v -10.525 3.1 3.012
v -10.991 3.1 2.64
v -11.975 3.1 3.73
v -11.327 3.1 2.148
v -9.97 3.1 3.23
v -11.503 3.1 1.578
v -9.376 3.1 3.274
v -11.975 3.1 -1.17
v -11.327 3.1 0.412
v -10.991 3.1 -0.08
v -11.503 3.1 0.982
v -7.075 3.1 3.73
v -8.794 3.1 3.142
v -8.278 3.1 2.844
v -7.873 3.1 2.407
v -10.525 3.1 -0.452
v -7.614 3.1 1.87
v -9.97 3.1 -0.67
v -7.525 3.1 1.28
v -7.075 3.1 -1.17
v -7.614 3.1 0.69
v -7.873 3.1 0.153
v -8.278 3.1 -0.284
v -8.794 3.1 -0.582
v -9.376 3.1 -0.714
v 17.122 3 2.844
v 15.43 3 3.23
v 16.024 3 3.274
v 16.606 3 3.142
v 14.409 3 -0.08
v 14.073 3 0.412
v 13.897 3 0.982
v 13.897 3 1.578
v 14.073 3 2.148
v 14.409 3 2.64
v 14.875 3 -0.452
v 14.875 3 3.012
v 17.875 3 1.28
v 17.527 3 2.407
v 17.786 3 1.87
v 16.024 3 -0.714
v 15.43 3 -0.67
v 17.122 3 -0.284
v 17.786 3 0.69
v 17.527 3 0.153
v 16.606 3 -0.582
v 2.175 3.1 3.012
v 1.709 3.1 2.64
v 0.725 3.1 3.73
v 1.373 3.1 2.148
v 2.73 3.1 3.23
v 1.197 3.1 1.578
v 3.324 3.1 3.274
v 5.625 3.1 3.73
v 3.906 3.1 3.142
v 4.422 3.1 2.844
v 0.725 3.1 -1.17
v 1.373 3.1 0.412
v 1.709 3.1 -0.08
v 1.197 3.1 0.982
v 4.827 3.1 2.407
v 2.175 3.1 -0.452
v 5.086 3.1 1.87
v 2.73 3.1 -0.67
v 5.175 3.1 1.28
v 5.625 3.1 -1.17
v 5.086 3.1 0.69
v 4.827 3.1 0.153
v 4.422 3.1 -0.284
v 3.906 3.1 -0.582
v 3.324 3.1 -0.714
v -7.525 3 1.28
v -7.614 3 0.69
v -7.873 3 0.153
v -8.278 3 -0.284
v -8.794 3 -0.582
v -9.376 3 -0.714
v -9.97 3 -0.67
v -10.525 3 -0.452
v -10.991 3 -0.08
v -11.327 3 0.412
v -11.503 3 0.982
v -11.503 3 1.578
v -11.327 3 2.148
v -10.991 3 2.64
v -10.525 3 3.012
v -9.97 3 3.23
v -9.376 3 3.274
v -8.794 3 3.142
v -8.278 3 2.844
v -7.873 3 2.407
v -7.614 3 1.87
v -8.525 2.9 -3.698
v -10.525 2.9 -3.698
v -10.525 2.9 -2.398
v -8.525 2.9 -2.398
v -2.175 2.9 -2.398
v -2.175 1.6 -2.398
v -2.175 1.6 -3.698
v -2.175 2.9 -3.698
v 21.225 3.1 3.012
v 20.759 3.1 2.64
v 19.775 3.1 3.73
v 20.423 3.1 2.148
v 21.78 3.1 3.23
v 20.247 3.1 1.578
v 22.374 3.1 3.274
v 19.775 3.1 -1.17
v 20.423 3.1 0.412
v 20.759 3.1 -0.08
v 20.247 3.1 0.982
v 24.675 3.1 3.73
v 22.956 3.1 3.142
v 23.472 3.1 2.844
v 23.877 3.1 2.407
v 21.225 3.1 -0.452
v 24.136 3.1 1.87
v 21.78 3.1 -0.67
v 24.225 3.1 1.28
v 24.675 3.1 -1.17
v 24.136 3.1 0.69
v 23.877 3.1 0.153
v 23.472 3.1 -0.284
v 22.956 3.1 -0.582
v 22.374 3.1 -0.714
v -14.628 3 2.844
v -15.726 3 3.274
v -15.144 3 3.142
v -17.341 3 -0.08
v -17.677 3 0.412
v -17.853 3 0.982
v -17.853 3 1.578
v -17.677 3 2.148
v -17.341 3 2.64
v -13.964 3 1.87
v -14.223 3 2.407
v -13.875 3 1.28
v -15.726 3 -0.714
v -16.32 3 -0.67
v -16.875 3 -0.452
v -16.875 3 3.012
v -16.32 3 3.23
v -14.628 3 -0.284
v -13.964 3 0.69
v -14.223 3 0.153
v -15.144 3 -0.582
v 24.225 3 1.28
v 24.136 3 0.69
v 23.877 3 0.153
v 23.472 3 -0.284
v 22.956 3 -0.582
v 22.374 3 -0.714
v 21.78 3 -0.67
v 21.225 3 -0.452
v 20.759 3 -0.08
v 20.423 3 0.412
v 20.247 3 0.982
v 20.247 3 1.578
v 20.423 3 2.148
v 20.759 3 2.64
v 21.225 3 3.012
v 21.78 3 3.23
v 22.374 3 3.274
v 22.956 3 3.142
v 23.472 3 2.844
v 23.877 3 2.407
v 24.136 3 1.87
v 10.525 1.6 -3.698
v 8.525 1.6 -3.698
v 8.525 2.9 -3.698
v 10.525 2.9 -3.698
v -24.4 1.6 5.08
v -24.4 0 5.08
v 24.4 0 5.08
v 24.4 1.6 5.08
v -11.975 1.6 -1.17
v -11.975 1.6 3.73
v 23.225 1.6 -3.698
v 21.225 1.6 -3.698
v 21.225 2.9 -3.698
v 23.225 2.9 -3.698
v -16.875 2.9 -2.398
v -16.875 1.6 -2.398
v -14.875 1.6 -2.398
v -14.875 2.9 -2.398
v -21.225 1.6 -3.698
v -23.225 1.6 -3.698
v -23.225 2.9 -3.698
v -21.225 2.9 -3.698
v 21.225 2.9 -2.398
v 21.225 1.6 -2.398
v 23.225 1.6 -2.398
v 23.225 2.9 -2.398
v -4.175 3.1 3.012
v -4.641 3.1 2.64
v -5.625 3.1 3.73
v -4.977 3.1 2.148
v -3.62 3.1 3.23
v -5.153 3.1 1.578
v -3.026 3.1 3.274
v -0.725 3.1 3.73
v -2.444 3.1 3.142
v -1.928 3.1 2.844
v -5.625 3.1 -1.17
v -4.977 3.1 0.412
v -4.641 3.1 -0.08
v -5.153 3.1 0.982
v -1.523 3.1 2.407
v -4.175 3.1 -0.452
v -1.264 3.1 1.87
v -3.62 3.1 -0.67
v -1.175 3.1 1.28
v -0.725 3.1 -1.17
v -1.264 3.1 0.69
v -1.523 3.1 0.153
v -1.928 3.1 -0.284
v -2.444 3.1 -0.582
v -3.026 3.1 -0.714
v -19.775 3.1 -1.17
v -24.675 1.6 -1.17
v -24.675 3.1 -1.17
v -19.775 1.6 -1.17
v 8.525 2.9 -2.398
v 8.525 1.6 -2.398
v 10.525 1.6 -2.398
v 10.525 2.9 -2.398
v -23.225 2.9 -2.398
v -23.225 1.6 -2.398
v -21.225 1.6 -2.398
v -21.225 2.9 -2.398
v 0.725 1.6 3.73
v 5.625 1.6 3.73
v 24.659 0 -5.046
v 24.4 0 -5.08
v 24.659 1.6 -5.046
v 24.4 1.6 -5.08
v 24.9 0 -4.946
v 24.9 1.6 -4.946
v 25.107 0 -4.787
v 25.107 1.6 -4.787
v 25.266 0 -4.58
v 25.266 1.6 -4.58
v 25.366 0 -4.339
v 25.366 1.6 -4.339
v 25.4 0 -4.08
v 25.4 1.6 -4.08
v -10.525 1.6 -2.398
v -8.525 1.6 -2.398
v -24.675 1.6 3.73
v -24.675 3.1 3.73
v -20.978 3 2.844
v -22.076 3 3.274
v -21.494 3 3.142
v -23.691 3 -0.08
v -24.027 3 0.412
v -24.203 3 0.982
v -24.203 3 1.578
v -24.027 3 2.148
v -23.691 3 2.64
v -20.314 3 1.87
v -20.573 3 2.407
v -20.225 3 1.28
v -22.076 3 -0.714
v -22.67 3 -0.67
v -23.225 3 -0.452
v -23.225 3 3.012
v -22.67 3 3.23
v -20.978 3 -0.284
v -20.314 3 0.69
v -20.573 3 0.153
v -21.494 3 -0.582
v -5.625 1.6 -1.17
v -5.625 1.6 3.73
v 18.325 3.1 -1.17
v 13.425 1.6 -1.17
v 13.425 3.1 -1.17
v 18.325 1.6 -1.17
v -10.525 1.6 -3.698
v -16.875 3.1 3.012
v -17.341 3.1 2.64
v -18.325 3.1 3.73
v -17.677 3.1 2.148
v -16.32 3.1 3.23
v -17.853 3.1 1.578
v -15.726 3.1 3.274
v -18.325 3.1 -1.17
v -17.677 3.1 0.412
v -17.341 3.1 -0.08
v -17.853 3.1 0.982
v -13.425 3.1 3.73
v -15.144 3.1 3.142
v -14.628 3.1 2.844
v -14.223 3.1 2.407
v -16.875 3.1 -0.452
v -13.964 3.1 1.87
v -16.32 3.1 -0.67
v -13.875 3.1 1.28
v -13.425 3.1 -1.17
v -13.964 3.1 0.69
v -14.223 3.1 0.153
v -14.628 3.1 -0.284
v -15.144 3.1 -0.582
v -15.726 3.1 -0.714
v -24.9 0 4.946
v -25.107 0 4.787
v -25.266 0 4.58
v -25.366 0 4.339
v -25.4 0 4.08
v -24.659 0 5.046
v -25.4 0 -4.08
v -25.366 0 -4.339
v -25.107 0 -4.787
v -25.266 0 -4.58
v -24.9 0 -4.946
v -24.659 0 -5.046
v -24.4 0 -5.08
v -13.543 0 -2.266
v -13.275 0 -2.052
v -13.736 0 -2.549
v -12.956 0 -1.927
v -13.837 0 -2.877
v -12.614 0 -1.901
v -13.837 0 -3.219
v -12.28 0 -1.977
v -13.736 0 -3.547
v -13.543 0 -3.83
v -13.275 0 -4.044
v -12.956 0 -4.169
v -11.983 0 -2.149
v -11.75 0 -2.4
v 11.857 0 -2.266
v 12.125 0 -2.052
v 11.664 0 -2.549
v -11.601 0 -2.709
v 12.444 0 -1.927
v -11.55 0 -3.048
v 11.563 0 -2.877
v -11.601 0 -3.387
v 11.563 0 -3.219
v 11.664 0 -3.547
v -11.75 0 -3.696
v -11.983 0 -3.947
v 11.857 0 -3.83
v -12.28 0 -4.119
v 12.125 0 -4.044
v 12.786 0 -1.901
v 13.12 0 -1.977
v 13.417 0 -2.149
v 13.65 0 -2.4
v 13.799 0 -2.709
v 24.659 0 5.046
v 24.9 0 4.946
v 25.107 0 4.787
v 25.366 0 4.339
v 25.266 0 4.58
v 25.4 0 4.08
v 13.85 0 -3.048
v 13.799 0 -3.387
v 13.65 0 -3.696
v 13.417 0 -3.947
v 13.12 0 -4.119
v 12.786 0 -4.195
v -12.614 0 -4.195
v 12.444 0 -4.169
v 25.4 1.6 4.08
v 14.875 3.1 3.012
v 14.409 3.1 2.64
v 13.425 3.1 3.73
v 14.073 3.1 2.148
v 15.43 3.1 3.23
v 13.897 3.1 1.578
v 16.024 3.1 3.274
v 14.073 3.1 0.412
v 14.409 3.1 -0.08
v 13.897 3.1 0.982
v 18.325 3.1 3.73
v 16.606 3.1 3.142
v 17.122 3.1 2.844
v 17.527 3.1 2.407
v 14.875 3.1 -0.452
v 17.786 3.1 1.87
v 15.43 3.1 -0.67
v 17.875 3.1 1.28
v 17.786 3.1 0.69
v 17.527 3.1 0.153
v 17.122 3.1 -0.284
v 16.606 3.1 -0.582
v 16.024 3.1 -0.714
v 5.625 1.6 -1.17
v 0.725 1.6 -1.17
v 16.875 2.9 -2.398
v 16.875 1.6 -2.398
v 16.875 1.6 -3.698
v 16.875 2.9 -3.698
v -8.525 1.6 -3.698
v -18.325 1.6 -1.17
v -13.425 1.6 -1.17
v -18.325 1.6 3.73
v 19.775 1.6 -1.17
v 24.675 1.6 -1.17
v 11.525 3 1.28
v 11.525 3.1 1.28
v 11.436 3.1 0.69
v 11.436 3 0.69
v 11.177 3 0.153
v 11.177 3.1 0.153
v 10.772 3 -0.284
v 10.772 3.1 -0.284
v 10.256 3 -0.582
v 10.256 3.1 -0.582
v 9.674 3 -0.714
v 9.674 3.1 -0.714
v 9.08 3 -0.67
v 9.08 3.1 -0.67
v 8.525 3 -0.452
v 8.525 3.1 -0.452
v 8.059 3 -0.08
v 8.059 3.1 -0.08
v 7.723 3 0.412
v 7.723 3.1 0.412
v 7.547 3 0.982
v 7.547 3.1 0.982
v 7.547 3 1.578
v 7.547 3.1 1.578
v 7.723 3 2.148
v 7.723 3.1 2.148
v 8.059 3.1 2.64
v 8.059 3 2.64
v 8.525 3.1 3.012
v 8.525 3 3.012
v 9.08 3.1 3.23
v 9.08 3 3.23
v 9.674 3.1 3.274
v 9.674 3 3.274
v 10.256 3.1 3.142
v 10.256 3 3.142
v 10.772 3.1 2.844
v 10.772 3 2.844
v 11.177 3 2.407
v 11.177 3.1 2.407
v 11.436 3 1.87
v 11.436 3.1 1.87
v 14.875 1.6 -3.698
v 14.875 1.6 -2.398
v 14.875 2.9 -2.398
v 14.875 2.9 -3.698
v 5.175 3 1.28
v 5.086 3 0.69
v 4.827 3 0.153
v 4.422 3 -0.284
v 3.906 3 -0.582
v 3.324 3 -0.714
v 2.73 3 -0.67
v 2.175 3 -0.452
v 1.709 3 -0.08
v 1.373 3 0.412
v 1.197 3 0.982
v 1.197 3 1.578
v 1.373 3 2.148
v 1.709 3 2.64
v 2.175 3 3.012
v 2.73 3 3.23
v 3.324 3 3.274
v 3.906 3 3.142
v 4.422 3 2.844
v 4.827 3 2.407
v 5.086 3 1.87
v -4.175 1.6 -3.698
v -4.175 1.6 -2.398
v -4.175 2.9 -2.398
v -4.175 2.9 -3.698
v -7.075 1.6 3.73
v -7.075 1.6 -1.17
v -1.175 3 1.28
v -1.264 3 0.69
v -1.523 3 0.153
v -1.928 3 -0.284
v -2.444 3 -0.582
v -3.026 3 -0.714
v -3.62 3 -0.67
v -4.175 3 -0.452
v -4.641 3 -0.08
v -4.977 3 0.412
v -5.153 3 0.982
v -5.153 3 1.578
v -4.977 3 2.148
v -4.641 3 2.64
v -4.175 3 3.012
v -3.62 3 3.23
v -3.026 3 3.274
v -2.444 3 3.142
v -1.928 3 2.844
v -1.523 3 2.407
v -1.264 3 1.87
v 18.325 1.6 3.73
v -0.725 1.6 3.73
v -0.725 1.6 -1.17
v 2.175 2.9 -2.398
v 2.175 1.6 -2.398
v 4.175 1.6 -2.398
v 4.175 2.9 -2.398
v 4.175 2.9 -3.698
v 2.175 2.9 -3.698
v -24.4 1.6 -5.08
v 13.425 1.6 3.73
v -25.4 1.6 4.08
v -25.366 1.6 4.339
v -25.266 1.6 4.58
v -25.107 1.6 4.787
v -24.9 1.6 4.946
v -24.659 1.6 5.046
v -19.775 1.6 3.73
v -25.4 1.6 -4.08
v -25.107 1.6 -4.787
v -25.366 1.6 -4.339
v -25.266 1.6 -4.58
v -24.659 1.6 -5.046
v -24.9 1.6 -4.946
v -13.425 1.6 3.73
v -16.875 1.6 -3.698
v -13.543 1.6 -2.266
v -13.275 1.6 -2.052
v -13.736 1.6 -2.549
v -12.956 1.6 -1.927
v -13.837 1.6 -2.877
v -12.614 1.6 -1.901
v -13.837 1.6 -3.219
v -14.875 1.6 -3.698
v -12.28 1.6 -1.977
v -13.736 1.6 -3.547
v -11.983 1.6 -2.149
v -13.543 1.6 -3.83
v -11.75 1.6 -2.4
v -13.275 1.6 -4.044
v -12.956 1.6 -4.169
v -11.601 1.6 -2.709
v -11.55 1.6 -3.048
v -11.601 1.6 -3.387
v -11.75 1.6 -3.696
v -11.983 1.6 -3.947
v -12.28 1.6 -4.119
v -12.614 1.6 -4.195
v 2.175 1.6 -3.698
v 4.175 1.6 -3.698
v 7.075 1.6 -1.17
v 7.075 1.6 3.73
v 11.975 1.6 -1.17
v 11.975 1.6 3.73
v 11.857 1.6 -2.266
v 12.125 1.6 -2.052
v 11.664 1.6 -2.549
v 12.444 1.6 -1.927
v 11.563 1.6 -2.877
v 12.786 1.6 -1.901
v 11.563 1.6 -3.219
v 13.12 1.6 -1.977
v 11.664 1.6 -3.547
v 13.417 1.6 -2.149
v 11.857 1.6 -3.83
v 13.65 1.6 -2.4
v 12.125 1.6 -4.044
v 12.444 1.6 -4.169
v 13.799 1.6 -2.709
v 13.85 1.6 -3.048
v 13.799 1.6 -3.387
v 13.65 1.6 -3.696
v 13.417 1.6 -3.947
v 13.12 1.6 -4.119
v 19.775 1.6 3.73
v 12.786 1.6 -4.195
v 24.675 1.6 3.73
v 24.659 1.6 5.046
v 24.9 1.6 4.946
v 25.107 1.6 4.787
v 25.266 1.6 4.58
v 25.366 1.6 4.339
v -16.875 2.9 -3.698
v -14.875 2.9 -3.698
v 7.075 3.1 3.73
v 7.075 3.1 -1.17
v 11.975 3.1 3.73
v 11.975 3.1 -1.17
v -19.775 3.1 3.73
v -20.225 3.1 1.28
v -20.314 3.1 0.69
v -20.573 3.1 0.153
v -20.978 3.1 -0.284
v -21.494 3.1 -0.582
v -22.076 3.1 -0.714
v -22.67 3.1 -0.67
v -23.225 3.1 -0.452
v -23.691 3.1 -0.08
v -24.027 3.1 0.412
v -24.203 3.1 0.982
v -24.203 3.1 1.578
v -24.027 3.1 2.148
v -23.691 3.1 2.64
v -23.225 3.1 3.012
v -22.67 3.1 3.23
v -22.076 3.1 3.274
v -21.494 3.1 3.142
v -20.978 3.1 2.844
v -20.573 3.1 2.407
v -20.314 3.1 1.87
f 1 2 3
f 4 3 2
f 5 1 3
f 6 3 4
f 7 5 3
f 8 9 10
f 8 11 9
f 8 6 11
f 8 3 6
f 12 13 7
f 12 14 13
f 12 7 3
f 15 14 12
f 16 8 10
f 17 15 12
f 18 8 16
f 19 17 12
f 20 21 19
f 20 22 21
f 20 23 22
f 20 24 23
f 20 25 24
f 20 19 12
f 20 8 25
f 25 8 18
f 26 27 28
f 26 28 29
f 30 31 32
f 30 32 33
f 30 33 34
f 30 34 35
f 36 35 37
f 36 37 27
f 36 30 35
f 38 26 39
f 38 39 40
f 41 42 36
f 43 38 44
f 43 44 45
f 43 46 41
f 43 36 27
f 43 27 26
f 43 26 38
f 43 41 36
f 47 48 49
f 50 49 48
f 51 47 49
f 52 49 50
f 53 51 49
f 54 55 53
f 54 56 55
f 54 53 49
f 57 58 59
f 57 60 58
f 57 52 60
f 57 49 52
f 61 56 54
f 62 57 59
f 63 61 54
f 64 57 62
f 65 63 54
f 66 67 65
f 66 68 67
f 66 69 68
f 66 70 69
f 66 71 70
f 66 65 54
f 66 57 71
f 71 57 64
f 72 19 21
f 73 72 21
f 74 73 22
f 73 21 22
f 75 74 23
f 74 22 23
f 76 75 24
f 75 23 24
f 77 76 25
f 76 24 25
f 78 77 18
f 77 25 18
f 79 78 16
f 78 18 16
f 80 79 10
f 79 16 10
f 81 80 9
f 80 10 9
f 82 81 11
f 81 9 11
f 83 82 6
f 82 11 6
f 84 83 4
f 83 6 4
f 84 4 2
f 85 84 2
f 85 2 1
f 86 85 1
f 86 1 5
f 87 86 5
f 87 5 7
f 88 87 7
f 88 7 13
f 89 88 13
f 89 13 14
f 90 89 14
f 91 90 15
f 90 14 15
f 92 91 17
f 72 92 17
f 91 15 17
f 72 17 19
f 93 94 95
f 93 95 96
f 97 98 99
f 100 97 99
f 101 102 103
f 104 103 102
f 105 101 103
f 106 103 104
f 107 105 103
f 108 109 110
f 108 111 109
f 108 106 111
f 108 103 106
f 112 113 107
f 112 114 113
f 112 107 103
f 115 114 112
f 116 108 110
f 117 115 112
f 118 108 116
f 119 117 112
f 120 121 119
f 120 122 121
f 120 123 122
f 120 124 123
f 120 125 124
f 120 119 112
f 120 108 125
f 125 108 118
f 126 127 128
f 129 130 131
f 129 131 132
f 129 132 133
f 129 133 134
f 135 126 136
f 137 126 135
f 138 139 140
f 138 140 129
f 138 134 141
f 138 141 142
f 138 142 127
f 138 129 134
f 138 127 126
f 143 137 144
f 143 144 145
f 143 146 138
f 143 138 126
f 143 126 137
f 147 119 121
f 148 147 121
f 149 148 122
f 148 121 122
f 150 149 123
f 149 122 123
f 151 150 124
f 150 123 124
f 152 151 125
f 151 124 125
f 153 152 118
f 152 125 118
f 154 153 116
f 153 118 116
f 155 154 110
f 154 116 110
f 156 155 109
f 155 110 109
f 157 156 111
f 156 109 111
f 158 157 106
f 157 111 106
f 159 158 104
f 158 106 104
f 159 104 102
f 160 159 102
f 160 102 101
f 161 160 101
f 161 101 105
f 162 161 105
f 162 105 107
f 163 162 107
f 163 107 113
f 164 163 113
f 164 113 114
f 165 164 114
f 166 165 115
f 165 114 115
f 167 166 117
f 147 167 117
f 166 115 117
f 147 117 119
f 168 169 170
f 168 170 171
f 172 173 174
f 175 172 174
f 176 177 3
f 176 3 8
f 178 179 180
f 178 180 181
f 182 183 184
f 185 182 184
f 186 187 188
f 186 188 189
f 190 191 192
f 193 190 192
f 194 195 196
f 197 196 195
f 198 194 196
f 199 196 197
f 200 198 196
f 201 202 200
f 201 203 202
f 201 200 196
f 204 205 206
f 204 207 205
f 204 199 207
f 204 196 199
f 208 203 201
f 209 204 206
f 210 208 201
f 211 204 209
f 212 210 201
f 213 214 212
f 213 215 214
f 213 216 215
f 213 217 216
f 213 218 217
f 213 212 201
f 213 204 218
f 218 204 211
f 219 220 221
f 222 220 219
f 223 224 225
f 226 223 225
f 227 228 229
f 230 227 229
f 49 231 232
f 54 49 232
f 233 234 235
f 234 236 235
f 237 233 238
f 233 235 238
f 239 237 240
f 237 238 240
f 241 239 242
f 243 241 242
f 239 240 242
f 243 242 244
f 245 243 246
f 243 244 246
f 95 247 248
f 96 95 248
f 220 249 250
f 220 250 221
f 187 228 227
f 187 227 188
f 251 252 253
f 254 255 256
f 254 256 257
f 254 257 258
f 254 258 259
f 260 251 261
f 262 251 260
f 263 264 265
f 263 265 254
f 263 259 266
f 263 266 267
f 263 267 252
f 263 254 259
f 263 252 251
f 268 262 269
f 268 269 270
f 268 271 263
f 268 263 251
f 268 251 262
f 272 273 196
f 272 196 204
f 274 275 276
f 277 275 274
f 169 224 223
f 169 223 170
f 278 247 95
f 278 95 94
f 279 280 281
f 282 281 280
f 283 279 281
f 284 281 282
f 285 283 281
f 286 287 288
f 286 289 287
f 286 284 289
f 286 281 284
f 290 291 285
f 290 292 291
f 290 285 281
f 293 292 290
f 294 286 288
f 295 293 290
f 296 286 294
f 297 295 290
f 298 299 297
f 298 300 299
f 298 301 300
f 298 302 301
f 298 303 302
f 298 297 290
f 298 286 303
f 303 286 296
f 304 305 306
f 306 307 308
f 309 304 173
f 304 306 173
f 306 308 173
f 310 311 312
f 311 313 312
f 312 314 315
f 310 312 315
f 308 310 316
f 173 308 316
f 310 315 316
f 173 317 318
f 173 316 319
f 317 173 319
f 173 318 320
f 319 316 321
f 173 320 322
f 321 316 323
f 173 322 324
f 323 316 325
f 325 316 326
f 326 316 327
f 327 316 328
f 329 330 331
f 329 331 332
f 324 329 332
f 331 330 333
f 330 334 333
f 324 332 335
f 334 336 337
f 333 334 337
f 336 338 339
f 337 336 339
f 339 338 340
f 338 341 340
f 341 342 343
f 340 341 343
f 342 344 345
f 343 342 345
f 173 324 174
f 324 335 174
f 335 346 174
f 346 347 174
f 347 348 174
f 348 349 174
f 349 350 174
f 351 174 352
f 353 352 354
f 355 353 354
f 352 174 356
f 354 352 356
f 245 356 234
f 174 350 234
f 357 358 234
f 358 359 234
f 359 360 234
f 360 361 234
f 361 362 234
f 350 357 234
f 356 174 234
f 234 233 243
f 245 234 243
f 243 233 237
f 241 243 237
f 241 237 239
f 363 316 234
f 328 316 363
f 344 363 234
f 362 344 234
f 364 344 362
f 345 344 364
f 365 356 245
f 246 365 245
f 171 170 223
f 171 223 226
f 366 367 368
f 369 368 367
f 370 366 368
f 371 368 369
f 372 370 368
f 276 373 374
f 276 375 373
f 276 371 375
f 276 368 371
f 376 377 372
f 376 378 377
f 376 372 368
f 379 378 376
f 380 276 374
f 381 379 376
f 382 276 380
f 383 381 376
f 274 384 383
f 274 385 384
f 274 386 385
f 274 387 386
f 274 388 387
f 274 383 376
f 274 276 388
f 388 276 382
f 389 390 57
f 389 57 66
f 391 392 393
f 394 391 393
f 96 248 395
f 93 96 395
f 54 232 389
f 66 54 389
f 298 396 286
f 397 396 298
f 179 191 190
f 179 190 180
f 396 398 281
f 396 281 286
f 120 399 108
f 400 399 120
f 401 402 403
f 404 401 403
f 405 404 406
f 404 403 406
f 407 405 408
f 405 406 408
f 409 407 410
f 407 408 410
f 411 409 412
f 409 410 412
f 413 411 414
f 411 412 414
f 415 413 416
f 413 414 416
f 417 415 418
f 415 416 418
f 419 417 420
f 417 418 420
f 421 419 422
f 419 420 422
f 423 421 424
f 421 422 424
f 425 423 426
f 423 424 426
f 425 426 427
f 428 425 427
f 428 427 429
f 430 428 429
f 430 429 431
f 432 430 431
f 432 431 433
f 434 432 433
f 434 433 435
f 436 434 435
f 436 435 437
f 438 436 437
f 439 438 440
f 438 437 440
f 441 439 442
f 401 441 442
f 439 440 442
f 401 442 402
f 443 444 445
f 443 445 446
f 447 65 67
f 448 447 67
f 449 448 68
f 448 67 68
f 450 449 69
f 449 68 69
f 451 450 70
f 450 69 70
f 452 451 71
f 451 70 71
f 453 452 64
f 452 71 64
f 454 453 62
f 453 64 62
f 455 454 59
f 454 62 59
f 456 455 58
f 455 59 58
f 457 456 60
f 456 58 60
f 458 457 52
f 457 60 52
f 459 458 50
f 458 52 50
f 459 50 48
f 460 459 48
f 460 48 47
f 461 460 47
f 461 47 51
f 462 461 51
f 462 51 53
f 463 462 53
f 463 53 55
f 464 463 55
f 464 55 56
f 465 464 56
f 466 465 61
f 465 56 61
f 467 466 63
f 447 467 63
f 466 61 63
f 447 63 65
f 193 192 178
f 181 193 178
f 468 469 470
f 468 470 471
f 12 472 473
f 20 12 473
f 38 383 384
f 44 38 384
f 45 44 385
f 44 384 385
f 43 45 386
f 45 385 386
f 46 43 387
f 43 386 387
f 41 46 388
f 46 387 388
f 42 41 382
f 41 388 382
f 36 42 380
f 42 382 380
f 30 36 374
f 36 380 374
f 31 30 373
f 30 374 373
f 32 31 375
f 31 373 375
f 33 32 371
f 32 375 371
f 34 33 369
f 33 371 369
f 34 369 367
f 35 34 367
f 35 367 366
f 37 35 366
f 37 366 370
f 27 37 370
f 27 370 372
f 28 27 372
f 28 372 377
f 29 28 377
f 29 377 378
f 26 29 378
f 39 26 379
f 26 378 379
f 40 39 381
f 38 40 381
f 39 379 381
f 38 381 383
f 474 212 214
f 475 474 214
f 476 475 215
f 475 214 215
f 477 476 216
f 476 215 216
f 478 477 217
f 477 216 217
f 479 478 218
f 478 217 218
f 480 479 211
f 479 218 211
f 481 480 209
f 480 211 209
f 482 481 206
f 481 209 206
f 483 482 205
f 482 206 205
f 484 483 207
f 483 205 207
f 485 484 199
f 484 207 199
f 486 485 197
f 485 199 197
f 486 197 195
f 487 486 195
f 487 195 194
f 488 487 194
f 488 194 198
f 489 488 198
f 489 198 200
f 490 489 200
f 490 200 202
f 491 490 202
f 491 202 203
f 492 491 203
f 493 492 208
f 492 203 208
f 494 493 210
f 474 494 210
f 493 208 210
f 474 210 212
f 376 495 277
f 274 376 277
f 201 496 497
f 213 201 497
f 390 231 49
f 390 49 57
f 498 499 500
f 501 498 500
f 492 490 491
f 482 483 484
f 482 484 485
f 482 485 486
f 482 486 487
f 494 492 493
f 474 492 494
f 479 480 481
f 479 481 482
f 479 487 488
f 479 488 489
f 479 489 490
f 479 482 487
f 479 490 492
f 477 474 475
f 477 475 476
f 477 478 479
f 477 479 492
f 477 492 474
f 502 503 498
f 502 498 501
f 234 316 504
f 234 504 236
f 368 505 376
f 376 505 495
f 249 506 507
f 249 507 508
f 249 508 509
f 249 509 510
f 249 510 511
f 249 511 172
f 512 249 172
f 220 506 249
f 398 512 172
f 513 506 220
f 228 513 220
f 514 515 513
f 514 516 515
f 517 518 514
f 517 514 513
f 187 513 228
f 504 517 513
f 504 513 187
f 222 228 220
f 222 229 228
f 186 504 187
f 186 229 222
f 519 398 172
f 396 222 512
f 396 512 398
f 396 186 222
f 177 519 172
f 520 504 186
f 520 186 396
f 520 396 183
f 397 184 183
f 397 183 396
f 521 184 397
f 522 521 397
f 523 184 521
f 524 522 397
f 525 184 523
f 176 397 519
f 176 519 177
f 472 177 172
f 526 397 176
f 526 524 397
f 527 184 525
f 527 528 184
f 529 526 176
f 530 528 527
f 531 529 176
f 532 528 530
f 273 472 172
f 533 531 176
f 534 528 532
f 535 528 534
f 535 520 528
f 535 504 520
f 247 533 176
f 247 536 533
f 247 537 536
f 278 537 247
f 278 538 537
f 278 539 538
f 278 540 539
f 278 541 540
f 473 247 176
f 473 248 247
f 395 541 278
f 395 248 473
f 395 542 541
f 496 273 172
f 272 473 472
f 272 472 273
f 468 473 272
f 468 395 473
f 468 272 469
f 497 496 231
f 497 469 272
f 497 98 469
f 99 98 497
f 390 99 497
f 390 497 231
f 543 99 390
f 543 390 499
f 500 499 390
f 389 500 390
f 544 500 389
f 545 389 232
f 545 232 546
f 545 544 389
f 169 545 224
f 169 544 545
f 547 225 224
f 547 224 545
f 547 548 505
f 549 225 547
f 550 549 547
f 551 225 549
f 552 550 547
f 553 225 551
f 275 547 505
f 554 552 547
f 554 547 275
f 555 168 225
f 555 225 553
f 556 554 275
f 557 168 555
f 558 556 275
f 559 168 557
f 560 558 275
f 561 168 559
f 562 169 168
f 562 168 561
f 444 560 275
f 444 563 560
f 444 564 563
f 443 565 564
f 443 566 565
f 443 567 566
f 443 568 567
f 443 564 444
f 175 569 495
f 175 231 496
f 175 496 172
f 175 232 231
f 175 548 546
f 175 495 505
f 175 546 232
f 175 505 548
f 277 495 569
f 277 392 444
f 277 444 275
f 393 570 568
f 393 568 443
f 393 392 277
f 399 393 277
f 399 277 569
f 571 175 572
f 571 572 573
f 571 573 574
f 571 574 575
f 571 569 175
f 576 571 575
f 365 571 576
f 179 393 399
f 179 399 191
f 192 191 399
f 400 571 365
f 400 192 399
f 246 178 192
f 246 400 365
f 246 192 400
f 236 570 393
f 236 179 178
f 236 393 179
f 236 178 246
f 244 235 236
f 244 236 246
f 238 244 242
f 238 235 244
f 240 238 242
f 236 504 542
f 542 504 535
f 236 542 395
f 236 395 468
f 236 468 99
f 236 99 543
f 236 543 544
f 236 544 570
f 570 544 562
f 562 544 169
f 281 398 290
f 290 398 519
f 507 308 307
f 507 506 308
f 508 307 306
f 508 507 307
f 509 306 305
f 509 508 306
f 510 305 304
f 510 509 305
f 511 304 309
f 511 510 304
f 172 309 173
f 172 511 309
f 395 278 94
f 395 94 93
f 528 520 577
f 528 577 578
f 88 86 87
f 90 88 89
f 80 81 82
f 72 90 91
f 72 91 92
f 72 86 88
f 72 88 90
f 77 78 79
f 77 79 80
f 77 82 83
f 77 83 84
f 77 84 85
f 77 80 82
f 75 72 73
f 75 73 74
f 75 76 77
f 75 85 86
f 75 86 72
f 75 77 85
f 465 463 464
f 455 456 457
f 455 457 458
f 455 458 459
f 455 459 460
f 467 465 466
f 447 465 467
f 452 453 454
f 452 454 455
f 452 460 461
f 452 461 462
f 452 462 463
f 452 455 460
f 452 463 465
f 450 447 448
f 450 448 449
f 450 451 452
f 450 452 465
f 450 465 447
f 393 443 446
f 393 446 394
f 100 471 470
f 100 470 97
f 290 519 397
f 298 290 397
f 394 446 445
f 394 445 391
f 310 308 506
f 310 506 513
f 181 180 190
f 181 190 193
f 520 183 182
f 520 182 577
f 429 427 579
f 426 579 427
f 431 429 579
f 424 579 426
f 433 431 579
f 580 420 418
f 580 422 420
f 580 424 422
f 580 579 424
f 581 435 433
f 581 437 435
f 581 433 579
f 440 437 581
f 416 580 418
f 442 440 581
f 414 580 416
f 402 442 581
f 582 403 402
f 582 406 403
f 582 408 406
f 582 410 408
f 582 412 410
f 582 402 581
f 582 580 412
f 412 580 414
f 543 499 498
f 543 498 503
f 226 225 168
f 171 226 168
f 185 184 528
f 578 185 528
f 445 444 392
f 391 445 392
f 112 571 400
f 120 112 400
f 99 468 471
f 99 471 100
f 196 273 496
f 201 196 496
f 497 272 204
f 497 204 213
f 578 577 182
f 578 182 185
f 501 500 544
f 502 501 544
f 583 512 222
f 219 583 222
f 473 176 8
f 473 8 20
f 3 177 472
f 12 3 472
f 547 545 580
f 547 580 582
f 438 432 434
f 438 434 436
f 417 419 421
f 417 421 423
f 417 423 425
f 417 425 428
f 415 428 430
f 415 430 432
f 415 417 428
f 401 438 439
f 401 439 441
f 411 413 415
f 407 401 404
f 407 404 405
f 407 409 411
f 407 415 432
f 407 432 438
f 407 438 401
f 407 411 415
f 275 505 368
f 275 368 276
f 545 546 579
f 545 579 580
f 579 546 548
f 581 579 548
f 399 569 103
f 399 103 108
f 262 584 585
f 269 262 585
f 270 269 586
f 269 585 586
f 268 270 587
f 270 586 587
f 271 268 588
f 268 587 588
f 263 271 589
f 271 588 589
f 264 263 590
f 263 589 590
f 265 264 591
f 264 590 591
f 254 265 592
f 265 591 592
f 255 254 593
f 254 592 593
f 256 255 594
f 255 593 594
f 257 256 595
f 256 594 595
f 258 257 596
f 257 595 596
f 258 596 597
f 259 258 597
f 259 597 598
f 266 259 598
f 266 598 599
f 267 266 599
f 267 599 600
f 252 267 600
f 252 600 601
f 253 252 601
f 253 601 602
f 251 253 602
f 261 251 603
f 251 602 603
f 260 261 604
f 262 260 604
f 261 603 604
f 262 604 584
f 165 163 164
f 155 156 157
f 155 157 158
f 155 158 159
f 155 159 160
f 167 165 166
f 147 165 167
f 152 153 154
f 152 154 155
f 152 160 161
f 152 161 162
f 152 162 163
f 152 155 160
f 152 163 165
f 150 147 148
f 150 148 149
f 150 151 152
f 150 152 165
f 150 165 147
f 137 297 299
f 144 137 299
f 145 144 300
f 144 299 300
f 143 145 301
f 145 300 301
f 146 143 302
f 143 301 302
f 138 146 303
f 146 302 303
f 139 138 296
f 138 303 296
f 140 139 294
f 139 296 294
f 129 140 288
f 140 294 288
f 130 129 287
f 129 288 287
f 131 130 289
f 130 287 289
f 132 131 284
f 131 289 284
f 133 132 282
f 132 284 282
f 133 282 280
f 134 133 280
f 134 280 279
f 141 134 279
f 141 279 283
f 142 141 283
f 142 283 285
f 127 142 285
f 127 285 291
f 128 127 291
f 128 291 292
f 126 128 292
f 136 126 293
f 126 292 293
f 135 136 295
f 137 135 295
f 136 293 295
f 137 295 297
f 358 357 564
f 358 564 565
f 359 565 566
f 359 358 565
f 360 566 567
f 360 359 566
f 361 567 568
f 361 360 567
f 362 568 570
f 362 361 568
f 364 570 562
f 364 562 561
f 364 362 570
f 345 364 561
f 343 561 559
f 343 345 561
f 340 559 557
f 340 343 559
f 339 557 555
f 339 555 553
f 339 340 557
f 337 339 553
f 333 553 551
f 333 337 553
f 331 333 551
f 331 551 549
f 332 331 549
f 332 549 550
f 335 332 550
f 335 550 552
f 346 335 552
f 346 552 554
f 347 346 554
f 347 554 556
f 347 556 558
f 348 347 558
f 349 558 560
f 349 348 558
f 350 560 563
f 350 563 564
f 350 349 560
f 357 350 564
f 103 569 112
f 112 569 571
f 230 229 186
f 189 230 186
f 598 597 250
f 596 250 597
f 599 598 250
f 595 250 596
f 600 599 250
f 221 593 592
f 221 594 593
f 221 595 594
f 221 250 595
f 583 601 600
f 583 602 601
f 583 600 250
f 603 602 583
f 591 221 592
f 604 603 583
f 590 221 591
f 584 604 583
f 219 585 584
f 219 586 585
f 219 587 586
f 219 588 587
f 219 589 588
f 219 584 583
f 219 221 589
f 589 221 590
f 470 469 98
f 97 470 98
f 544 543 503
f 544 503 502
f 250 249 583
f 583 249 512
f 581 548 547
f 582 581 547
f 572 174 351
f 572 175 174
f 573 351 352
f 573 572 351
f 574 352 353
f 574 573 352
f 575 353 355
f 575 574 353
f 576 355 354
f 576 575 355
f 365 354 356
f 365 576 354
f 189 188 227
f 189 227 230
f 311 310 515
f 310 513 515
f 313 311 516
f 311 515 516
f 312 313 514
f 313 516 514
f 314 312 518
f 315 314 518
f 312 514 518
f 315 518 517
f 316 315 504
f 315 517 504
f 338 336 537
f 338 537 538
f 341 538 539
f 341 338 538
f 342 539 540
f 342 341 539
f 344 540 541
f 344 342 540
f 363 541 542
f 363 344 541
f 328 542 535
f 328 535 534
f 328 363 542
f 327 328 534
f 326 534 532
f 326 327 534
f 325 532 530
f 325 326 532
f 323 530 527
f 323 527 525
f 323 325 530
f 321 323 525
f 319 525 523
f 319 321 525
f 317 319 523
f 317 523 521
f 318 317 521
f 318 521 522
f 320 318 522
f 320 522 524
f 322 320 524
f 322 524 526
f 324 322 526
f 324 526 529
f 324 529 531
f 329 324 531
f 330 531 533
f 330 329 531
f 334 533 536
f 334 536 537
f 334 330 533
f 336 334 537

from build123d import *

# Parameters (mm, degrees)
SKETCH1_W         = 50.8
SKETCH1_H         = 10.16
SKETCH1_R         = 1.15
PCB_DEPTH         = 1.6
SKETCH2_W         = 4.9
SKETCH2_H         = 4.9
LEDS_DEPTH        = 1.5
SKETCH3_W         = 2
SKETCH3_H         = 1.3
CAPS_DEPTH        = 1.3
SKETCH4_R         = 2
LED_WINDOWS_DEPTH = 0.1
FILED_FILLETS_R   = 1


with BuildPart() as part:
    # Sketch1 → PCB (new body)
    with BuildSketch(Plane(origin=(0, 0, 0), x_dir=(1, 0, 0), z_dir=(0, 1, 0))):
        Rectangle(SKETCH1_W, SKETCH1_H)
        with Locations((-12.7, 3.048)):
            Circle(SKETCH1_R, mode=Mode.SUBTRACT)
        with Locations((12.7, 3.048)):
            Circle(SKETCH1_R, mode=Mode.SUBTRACT)
    extrude(amount=PCB_DEPTH)

    # Sketch2 → LEDs (add)
    with BuildSketch(Plane(origin=(0, 1.6, 0), x_dir=(1, 0, 0), z_dir=(0, 1, 0))):
        with Locations((3.175, -1.28)):
            Rectangle(SKETCH2_W, SKETCH2_H)
        with Locations((-3.175, -1.28)):
            Rectangle(SKETCH2_W, SKETCH2_H)
        with Locations((9.525, -1.28)):
            Rectangle(SKETCH2_W, SKETCH2_H)
        with Locations((15.875, -1.28)):
            Rectangle(SKETCH2_W, SKETCH2_H)
        with Locations((22.225, -1.28)):
            Rectangle(SKETCH2_W, SKETCH2_H)
        with Locations((-22.225, -1.28)):
            Rectangle(SKETCH2_W, SKETCH2_H)
        with Locations((-15.875, -1.28)):
            Rectangle(SKETCH2_W, SKETCH2_H)
        with Locations((-9.525, -1.28)):
            Rectangle(SKETCH2_W, SKETCH2_H)
    extrude(amount=LEDS_DEPTH)

    # Sketch3 → Caps (add)
    with BuildSketch(Plane(origin=(0, 1.6, 0), x_dir=(1, 0, 0), z_dir=(0, 1, 0))):
        with Locations((-15.875, 3.048)):
            Rectangle(SKETCH3_W, SKETCH3_H)
        with Locations((-22.225, 3.048)):
            Rectangle(SKETCH3_W, SKETCH3_H)
        with Locations((-9.525, 3.048)):
            Rectangle(SKETCH3_W, SKETCH3_H)
        with Locations((-3.175, 3.048)):
            Rectangle(SKETCH3_W, SKETCH3_H)
        with Locations((3.175, 3.048)):
            Rectangle(SKETCH3_W, SKETCH3_H)
        with Locations((9.525, 3.048)):
            Rectangle(SKETCH3_W, SKETCH3_H)
        with Locations((15.875, 3.048)):
            Rectangle(SKETCH3_W, SKETCH3_H)
        with Locations((22.225, 3.048)):
            Rectangle(SKETCH3_W, SKETCH3_H)
    extrude(amount=CAPS_DEPTH)

    # Sketch4 → LED windows (cut)
    with BuildSketch(Plane(origin=(0, 3.1, 0), x_dir=(1, 0, 0), z_dir=(0, 1, 0))):
        with Locations((-22.225, -1.28)):
            Circle(SKETCH4_R)
        with Locations((-15.875, -1.28)):
            Circle(SKETCH4_R)
        with Locations((-9.525, -1.28)):
            Circle(SKETCH4_R)
        with Locations((-3.175, -1.28)):
            Circle(SKETCH4_R)
        with Locations((3.175, -1.28)):
            Circle(SKETCH4_R)
        with Locations((9.525, -1.28)):
            Circle(SKETCH4_R)
        with Locations((15.875, -1.28)):
            Circle(SKETCH4_R)
        with Locations((22.225, -1.28)):
            Circle(SKETCH4_R)
    extrude(amount=-LED_WINDOWS_DEPTH, mode=Mode.SUBTRACT)

    # Filed fillets
    filed_fillets_edges = [part.edges().sort_by_distance(p)[0] for p in [
        (25.4, 0.8, 5.08),
        (-25.4, 0.8, 5.08),
        (-25.4, 0.8, -5.08),
        (25.4, 0.8, -5.08),
    ]]
    fillet(filed_fillets_edges, radius=FILED_FILLETS_R)


solid = part.part
